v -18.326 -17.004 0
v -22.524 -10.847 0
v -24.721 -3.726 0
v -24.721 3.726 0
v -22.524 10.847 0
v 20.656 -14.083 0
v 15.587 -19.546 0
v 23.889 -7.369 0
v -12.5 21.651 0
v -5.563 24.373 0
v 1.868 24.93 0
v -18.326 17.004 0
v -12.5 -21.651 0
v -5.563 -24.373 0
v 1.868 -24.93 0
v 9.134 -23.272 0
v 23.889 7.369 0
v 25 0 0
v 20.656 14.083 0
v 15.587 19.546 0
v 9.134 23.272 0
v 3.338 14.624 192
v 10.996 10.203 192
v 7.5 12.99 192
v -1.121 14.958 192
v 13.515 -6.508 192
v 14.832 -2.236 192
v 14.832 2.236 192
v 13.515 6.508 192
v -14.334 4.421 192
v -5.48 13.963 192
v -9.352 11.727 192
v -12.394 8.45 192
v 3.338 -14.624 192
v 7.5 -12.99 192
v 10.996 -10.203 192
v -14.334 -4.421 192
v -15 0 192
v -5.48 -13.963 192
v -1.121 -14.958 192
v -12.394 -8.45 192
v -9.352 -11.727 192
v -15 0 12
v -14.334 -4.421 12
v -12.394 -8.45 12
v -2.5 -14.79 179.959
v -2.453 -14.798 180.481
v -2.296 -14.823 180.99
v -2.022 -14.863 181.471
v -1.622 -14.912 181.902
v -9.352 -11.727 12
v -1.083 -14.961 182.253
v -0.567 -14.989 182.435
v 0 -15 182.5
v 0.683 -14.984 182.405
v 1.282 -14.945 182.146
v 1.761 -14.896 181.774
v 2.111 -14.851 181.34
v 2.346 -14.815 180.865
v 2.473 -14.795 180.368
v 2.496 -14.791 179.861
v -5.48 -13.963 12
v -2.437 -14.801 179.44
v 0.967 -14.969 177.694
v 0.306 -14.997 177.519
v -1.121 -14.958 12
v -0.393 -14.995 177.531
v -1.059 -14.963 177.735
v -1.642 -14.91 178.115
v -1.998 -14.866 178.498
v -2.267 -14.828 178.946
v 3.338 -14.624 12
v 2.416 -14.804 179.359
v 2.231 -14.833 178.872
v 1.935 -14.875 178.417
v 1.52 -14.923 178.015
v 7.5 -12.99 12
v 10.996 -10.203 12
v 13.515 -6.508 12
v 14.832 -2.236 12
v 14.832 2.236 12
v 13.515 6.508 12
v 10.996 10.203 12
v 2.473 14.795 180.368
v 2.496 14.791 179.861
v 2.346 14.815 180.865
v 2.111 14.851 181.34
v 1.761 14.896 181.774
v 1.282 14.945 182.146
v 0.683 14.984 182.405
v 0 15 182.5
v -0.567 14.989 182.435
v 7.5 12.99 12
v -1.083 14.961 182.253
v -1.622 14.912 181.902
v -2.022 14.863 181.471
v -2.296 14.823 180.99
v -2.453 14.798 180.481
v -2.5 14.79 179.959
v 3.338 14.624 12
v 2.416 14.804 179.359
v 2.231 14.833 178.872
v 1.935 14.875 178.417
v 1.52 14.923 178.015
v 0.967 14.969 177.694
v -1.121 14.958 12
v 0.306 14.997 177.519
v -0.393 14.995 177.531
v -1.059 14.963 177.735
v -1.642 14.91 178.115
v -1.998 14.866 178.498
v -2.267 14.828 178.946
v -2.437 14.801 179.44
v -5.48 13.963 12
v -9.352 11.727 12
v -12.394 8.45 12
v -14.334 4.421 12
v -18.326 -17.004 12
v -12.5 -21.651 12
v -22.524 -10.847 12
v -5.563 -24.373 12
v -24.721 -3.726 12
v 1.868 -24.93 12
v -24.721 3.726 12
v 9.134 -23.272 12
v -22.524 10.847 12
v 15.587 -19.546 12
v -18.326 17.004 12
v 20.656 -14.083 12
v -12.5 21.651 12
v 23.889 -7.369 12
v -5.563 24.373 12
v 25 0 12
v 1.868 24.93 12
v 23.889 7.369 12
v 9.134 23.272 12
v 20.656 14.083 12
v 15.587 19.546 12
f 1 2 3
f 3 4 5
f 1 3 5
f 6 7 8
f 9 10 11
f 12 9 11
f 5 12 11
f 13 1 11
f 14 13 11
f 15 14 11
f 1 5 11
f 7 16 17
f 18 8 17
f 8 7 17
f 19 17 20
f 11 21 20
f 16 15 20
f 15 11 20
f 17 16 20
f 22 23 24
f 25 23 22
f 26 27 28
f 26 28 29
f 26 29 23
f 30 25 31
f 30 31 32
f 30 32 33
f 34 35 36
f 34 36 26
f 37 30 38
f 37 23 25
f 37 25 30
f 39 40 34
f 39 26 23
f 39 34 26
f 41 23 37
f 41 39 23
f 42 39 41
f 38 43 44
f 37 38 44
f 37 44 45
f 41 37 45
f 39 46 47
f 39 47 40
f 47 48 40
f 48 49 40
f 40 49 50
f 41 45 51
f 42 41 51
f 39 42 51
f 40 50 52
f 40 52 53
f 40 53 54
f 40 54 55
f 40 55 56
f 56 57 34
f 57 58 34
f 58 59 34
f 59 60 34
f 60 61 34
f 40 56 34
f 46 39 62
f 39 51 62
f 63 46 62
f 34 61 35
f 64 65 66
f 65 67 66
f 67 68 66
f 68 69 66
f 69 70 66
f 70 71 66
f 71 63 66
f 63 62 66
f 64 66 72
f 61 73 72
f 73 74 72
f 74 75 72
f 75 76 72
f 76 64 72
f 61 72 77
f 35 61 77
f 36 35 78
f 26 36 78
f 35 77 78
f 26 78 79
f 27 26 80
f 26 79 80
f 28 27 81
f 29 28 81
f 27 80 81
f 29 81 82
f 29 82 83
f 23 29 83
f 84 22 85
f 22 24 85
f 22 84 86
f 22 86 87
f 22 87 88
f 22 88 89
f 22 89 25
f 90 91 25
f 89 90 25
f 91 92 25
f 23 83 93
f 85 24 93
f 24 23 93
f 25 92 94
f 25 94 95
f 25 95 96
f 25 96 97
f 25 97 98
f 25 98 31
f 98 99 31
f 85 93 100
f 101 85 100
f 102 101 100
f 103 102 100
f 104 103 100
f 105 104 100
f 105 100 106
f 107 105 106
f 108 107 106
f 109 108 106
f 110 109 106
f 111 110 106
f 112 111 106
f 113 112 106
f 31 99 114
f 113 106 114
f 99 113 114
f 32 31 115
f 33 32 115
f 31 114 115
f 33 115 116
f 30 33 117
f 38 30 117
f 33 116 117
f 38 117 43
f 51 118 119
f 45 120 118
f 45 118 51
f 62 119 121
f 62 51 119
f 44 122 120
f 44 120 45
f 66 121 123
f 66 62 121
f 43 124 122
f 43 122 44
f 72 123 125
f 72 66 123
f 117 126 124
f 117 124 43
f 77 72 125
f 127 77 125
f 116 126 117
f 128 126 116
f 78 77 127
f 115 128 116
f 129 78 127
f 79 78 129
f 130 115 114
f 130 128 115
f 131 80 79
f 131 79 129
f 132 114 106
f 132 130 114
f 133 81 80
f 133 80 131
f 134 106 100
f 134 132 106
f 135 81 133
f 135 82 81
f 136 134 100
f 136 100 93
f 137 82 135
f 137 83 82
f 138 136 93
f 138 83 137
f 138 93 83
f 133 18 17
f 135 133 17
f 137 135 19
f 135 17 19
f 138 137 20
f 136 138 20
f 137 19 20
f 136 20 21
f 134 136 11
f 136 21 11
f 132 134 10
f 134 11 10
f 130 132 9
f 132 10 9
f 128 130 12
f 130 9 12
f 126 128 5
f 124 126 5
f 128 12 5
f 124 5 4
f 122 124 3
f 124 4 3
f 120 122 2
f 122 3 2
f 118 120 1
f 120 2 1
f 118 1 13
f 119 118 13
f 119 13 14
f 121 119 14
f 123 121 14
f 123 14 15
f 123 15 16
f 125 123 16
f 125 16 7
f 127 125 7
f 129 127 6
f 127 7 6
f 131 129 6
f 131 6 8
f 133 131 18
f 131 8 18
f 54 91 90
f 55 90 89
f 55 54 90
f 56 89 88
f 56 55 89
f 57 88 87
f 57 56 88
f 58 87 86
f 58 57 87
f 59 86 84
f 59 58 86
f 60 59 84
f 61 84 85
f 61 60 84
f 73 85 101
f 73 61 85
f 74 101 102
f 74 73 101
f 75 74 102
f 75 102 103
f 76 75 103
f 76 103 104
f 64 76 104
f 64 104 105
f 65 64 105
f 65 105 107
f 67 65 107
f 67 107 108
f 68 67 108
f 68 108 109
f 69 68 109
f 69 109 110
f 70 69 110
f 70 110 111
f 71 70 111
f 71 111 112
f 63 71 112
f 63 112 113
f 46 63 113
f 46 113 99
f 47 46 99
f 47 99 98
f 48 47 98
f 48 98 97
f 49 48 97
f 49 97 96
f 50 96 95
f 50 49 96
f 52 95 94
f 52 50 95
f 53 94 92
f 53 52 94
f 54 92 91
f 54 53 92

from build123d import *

# Parameters (mm, degrees)
SKETCH1_R               = 25
BOSS_EXTRUDE1_DEPTH     = 12
SKETCH2_R               = 15
BOSS_EXTRUDE2_DEPTH     = 180
CUT_EXTRUDE1_DEPTH      = 196.228071752
CUT_EXTRUDE1_DEPTH_BACK = 196.228071752
SKETCH3_R               = 2.5


with BuildPart() as part:
    # Sketch1 → Boss-Extrude1 (new body)
    with BuildSketch(Plane.XY):
        Circle(SKETCH1_R)
    extrude(amount=BOSS_EXTRUDE1_DEPTH)

    # Sketch2 → Boss-Extrude2 (add)
    with BuildSketch(Plane.XY.offset(12)):
        with Locations(Location((0, 0, 0), (0, 0, 180))):
            Circle(SKETCH2_R)
    extrude(amount=BOSS_EXTRUDE2_DEPTH)

    # Sketch3 → Cut-Extrude1 (cut, two sides: drawn at the far end of the back side and taken through both)
    with BuildSketch(Plane(origin=(0, 0, 0), x_dir=(1, 0, 0), z_dir=(0, 1, 0)).offset(-CUT_EXTRUDE1_DEPTH_BACK)):
        with Locations(Location((0, -180, 0), (0, 0, 270))):
            Circle(SKETCH3_R)
    extrude(amount=CUT_EXTRUDE1_DEPTH + CUT_EXTRUDE1_DEPTH_BACK, mode=Mode.SUBTRACT)


solid = part.part
